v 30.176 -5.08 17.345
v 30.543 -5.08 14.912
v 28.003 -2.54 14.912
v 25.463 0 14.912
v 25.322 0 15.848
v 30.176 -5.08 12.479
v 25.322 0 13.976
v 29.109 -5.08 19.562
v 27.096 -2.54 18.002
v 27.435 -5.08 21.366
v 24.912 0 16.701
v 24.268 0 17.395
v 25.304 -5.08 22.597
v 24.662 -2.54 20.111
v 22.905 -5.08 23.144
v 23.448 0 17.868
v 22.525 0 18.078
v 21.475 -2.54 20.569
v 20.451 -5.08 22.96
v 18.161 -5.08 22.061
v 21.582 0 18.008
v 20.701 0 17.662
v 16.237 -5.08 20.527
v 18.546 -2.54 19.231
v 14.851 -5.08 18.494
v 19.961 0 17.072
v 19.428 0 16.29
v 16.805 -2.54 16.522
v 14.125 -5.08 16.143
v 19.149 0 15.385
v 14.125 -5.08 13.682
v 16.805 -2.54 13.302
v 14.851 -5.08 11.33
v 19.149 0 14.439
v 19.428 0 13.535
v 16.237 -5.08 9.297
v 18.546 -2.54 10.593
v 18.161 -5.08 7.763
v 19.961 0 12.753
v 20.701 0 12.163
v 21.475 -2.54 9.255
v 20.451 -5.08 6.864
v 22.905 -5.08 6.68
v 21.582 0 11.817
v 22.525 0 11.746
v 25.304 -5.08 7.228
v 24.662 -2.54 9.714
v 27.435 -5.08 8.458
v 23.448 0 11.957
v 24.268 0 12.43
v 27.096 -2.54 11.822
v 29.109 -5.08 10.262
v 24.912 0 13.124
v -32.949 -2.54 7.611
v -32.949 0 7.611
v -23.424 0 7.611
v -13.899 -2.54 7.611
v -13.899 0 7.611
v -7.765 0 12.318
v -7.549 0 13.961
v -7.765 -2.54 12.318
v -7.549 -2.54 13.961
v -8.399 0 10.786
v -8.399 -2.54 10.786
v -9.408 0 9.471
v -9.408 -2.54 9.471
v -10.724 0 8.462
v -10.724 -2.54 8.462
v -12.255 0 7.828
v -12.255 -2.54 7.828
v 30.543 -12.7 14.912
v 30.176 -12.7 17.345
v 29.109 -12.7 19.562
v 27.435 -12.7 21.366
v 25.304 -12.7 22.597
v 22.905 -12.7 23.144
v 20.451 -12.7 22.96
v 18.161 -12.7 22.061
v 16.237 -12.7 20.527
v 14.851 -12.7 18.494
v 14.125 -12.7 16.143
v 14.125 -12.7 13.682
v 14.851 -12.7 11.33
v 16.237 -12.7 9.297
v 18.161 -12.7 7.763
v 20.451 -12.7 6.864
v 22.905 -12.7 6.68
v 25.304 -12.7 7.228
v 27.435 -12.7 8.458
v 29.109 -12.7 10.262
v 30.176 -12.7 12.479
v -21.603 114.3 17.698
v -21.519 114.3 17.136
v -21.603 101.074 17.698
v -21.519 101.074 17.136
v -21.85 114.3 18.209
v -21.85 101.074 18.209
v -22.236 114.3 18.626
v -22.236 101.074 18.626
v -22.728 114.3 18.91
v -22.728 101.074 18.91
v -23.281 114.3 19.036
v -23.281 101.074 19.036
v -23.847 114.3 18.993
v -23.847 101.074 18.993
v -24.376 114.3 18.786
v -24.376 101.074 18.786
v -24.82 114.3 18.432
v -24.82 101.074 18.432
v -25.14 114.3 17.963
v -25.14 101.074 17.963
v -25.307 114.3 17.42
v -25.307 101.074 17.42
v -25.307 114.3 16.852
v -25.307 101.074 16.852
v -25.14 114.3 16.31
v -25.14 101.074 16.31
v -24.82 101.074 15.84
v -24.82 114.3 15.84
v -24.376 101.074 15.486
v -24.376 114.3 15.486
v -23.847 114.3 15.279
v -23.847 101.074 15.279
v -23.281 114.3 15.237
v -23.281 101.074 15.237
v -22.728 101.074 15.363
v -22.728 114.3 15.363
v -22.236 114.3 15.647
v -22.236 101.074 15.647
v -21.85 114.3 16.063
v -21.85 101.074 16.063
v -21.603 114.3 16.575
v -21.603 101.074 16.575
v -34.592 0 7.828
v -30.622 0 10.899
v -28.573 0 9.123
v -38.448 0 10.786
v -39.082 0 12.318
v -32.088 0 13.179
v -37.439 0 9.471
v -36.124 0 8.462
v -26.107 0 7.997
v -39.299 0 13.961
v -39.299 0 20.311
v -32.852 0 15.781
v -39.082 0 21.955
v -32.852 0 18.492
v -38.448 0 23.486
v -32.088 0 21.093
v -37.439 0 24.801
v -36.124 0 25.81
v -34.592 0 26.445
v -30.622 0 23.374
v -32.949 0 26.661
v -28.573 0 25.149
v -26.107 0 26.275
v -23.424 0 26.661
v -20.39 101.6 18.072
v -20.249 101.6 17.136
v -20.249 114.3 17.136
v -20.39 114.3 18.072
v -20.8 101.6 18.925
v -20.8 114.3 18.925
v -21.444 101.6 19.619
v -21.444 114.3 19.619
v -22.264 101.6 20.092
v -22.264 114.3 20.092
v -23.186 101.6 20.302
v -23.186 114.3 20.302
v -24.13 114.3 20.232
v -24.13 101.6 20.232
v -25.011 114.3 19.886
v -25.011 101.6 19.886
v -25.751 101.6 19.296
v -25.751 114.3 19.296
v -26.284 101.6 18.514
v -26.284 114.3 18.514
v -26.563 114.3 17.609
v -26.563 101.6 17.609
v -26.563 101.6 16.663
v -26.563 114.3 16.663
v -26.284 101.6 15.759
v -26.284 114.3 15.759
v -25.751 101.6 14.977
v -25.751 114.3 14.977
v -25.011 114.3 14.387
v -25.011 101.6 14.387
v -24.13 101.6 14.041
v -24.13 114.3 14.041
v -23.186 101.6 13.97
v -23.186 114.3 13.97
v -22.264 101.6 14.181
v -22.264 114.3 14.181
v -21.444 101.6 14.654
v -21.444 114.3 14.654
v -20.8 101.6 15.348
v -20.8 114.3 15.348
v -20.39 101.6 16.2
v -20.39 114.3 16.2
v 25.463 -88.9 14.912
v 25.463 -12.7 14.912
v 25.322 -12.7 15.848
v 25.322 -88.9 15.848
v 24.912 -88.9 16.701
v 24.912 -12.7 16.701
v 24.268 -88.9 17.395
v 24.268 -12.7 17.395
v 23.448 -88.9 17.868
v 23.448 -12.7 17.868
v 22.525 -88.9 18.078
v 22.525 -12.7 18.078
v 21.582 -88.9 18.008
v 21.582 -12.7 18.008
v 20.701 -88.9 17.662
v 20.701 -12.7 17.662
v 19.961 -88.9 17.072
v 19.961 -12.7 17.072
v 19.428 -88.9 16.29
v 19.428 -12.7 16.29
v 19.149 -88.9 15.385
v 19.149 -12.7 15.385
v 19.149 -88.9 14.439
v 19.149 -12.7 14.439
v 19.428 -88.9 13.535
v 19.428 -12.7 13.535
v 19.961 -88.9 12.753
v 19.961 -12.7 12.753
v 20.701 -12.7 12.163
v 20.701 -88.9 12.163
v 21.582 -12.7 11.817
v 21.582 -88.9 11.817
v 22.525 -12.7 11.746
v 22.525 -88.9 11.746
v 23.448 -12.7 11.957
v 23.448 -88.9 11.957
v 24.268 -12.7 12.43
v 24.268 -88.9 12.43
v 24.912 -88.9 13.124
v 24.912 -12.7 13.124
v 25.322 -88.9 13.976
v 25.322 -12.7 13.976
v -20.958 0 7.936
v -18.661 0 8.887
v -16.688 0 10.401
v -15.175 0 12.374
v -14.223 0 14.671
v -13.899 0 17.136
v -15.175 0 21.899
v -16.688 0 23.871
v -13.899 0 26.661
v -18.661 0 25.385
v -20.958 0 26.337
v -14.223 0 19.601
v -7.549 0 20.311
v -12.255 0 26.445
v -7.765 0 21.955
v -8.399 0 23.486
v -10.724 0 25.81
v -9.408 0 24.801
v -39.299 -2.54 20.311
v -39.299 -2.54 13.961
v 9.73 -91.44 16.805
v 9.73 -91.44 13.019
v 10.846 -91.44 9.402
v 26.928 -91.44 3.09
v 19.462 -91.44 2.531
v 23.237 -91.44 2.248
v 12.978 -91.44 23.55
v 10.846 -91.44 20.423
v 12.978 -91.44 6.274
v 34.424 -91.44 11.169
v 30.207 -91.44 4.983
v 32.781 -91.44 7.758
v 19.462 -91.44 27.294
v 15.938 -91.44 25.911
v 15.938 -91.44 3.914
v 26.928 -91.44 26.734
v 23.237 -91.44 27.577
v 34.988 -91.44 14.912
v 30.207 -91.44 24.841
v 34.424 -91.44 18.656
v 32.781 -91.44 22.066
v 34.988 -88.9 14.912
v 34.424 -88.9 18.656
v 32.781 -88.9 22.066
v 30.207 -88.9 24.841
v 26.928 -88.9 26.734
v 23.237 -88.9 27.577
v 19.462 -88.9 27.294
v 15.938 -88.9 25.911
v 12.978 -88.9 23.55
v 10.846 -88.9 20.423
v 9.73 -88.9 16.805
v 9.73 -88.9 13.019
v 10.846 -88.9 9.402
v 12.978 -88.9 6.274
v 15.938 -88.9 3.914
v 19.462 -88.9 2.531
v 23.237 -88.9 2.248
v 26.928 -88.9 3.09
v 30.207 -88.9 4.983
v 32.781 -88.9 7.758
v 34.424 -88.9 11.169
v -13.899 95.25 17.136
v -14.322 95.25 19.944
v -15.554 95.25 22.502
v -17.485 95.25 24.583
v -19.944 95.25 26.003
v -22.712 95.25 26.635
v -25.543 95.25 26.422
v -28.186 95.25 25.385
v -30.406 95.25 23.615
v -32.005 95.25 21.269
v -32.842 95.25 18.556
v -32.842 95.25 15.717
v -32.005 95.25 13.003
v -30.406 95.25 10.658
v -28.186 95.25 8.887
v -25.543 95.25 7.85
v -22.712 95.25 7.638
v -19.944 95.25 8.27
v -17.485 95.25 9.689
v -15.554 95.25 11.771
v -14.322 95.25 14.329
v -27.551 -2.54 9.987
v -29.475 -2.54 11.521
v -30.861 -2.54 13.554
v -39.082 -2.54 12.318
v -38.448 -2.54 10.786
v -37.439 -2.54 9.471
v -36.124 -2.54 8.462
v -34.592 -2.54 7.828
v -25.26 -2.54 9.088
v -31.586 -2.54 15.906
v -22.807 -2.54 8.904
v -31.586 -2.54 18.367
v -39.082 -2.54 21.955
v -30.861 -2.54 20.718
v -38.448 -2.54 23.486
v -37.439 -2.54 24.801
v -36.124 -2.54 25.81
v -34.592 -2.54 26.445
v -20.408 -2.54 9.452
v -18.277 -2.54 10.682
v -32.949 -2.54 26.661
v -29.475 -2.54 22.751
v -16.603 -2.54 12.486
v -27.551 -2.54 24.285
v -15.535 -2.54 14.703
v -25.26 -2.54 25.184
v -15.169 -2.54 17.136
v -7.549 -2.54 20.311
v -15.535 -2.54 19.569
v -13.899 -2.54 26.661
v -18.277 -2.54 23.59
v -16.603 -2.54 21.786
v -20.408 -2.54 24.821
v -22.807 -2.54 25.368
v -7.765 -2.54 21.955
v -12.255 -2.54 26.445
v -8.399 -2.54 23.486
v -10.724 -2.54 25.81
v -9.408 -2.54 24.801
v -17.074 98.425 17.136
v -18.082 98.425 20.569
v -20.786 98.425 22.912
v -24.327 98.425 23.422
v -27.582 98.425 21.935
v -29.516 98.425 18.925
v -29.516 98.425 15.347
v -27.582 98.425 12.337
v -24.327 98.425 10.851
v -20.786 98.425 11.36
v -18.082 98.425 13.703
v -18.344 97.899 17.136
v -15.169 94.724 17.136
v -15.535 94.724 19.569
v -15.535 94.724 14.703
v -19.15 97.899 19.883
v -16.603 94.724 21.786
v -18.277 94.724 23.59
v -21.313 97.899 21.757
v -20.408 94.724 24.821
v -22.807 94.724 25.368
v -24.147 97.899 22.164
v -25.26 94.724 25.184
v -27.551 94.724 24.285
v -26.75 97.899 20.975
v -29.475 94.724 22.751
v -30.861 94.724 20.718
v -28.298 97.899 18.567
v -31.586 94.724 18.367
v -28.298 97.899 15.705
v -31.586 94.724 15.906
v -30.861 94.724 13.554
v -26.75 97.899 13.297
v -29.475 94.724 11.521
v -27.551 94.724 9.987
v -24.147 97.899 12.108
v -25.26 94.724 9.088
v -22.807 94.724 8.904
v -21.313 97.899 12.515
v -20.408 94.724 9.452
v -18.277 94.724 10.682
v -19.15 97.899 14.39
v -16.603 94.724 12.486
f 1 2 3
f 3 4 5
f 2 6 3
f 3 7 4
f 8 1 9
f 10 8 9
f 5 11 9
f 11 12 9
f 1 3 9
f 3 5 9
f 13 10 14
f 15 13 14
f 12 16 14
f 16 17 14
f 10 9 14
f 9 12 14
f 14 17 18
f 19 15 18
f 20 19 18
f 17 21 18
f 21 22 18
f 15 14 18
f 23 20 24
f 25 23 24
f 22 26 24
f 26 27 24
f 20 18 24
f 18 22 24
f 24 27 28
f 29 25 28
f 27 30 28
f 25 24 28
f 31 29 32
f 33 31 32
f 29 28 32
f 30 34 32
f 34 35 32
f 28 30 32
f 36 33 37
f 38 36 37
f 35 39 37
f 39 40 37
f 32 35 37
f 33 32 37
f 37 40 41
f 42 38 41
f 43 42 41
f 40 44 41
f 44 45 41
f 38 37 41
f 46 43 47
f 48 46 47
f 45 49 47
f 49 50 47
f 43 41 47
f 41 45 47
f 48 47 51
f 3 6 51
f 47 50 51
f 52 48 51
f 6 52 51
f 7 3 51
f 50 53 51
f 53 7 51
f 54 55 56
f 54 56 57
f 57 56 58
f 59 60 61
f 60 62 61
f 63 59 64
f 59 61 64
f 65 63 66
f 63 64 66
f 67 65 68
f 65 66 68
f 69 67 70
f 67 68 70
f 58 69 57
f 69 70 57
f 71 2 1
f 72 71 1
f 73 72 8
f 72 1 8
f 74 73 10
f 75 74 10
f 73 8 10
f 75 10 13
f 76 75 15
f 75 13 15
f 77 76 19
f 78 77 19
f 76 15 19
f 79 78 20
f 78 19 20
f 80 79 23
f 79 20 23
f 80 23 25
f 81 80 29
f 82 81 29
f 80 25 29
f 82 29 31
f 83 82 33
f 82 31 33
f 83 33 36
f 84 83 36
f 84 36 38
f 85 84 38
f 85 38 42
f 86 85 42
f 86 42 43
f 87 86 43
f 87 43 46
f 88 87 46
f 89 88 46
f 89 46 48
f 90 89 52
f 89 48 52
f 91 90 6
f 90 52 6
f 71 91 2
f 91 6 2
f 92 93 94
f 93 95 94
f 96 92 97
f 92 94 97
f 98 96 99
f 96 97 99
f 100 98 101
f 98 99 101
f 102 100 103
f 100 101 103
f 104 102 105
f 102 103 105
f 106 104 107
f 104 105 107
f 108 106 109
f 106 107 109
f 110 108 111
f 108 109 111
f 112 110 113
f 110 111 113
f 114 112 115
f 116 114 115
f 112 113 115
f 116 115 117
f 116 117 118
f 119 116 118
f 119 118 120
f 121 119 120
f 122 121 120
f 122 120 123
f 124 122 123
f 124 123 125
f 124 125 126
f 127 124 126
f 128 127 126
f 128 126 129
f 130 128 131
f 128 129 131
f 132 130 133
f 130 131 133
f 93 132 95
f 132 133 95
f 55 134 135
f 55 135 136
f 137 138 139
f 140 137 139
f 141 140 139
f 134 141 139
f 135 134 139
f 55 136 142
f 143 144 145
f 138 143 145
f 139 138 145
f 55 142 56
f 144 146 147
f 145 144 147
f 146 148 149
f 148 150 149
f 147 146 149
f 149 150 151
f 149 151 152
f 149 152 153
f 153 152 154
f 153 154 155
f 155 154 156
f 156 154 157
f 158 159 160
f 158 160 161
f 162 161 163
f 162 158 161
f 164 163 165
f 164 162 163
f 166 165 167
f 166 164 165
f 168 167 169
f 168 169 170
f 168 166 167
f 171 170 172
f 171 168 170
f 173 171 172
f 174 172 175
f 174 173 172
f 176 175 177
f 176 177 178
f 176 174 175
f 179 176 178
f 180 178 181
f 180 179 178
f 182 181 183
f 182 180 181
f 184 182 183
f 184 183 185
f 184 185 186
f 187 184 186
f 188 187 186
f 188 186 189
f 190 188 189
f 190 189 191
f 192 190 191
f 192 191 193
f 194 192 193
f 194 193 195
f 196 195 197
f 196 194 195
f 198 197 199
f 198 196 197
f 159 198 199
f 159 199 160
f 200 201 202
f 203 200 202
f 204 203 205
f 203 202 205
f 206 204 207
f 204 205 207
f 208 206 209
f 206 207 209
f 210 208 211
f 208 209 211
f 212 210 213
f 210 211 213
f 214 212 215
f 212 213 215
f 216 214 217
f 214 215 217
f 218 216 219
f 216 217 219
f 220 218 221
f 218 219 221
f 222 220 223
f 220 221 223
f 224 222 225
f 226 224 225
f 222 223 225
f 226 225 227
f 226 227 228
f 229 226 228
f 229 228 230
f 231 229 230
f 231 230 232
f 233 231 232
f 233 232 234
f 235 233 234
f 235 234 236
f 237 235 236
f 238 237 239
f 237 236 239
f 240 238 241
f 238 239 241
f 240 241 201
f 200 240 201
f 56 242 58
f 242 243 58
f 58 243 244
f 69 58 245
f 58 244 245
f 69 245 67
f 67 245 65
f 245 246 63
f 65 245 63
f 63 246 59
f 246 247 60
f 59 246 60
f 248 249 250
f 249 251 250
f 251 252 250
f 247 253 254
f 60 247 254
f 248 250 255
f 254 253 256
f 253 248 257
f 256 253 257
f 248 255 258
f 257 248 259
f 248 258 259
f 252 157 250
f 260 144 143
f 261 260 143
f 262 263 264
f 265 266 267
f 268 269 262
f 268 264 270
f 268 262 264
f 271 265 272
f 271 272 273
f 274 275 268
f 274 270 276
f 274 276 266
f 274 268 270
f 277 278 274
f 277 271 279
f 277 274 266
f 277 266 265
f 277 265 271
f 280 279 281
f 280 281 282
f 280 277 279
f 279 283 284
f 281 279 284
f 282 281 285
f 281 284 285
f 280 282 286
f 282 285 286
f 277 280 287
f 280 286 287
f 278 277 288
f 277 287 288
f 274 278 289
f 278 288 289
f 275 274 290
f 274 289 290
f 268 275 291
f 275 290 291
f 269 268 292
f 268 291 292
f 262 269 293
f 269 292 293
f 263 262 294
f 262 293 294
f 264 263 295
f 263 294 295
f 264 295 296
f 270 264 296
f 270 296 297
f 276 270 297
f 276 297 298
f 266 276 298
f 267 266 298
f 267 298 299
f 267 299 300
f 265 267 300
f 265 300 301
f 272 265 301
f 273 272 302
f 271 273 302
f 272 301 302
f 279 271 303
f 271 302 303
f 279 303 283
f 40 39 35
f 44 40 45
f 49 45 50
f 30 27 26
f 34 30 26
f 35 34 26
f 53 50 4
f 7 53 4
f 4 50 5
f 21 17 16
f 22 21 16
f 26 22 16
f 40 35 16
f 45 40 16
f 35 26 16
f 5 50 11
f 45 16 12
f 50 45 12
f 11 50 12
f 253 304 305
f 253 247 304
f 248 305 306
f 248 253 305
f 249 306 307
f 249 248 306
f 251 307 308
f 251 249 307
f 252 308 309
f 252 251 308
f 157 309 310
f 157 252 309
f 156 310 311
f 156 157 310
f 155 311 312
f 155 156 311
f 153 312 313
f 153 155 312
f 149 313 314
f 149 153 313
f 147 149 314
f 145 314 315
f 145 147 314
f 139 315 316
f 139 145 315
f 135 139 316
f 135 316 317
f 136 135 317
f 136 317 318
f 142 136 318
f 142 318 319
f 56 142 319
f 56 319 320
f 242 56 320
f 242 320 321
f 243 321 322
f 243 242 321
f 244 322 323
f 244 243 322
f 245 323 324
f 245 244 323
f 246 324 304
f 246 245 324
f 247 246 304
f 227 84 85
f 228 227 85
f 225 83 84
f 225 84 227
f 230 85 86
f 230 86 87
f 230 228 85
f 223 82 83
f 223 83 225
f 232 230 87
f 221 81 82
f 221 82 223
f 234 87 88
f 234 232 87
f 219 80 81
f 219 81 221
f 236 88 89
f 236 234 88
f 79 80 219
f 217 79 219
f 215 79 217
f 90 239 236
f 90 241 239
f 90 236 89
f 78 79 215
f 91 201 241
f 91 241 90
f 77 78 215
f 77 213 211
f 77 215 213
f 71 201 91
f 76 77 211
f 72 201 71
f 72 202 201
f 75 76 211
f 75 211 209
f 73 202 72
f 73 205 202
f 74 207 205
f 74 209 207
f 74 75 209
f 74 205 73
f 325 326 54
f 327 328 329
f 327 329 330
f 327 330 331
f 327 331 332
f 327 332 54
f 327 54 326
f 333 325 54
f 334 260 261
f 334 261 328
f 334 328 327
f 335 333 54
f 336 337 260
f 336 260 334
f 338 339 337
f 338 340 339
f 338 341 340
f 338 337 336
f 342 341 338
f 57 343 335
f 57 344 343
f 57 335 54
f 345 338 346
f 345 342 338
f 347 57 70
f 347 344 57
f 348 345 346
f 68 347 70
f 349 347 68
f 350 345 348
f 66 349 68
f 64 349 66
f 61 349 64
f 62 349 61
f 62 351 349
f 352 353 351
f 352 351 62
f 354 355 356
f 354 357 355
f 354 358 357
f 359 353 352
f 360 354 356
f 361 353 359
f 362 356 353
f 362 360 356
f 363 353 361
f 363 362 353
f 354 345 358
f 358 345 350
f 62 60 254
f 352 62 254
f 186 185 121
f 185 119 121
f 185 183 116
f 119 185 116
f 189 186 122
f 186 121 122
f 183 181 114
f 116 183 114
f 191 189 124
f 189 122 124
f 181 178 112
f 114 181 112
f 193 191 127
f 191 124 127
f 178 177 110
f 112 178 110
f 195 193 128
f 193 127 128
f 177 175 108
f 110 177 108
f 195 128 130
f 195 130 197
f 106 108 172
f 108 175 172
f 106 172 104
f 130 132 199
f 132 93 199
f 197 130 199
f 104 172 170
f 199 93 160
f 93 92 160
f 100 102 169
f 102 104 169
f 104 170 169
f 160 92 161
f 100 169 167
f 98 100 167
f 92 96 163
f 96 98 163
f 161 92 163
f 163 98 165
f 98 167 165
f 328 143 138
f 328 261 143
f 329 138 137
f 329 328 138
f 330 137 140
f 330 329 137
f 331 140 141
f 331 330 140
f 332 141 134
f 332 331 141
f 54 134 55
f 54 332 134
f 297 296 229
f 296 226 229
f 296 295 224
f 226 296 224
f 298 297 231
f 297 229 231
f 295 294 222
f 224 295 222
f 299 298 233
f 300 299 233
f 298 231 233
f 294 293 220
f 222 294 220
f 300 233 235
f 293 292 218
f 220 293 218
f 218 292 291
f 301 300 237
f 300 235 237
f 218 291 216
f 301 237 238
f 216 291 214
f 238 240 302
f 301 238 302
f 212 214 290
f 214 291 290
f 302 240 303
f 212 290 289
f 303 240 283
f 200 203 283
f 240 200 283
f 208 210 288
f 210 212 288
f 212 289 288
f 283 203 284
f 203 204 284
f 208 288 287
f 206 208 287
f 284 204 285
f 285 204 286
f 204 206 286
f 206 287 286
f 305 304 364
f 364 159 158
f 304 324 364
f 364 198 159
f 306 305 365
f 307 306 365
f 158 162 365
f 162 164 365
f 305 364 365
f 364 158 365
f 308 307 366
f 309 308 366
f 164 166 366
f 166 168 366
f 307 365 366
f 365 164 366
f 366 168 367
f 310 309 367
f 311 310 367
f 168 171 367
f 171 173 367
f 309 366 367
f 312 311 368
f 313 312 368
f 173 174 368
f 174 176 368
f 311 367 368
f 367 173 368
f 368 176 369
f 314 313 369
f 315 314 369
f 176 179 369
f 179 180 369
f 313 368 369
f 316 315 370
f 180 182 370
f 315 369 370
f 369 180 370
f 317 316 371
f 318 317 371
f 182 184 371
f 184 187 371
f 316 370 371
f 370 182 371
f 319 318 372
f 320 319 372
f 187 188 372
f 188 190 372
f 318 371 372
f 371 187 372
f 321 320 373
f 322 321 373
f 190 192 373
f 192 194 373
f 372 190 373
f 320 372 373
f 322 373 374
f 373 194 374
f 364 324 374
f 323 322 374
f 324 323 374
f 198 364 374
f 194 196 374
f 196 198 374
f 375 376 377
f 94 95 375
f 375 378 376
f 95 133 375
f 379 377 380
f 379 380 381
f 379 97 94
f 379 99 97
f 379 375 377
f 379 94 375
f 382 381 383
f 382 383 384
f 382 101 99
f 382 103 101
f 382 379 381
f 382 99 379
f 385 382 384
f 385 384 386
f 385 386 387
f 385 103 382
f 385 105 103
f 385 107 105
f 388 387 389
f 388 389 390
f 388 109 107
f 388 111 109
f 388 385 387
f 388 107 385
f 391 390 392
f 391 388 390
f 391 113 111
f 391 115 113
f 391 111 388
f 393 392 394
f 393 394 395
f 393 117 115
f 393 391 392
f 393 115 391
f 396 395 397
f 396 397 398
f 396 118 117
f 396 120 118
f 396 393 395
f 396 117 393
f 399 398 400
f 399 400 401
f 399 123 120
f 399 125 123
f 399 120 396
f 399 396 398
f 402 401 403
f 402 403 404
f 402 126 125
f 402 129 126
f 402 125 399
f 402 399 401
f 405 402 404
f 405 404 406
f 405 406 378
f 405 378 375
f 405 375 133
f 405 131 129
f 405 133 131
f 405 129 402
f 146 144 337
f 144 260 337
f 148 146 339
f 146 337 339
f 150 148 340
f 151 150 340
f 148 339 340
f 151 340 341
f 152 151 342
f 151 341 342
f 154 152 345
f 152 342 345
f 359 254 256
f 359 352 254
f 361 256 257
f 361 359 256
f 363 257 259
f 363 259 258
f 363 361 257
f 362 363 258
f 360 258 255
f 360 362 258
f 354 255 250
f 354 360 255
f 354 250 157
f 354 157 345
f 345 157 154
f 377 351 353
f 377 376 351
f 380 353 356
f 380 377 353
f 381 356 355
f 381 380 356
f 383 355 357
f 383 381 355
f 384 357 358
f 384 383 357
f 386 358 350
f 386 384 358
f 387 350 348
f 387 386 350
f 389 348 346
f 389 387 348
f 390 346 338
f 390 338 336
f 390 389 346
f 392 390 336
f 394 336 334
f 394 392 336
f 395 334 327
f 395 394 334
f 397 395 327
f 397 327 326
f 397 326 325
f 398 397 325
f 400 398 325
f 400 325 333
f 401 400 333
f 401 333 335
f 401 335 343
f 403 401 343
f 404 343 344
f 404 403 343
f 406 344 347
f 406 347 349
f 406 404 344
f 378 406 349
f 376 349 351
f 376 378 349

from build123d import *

# Parameters (mm, degrees)
F0_R      = 9.525
F1_DEPTH  = 101.6
F2_SIZE   = 6.35
F3_DEPTH  = 12.7
F4_T      = -1.27
F5_DEPTH  = 25.4
F6_R      = 8.255
F7_DEPTH  = 2.54
F8_R      = 6.35
F9_R      = 8.255
F10_DEPTH = 12.7
F11_R     = 3.175
F12_DEPTH = 76.2
F13_R     = 12.7
F13_R_2   = 3.175
F14_DEPTH = 2.54
F15_SIZE  = 5.08


with BuildPart() as f1:
    # F0 (on Front) → F1 (new body)
    with BuildSketch(Plane.XZ):
        with Locations((-23.4235748649, 17.1361938119)):
            Circle(F0_R)
    extrude(amount=-F1_DEPTH)

    # F2
    f2_edges = [f1.edges().sort_by_distance(p)[0] for p in [
        (-32.948575, 101.6, 17.136194),
    ]]
    chamfer(f2_edges, length=F2_SIZE)

    # F3 (add): a face of the model
    f3_faces = [f1.faces().sort_by_distance(p)[0] for p in [
        (-23.4235748649, 101.6, 17.1361938119),
    ]]
    extrude(f3_faces, amount=F3_DEPTH)

    # F4
    f4_openings = [f1.faces().sort_by_distance(p)[0] for p in [
        (-23.423575, 0, 17.136194),
    ]]
    offset(amount=F4_T, openings=f4_openings, kind=Kind.INTERSECTION)

    # F5 (cut): a face of the model
    f5_faces = [f1.faces().sort_by_distance(p)[0] for p in [
        (-23.4235748649, 113.03, 17.1361938119),
    ]]
    extrude(f5_faces, amount=-F5_DEPTH, mode=Mode.SUBTRACT)

    # F6 (on face) → F7 (join)
    with BuildSketch(Plane.XZ):
        with BuildLine():
            Line((-23.4235748649, 26.6611938119), (-39.2985748649, 26.6611938119))
            Line((-39.2985748649, 26.6611938119), (-39.2985748649, 7.6111938119))
            Line((-39.2985748649, 7.6111938119), (-23.4235748649, 7.6111938119))
            ThreePointArc((-23.4235748649, 7.6111938119), (-32.9485748649, 17.1361938119), (-23.4235748649, 26.6611938119))
        make_face()
        with BuildLine():
            Line((-7.5485748649, 26.6611938119), (-23.4235748649, 26.6611938119))
            ThreePointArc((-23.4235748649, 26.6611938119), (-16.6883827741, 23.8713859027), (-13.8985748649, 17.1361938119))
            ThreePointArc((-13.8985748649, 17.1361938119), (-16.6883827741, 10.4010017211), (-23.4235748649, 7.6111938119))
            Line((-23.4235748649, 7.6111938119), (-7.5485748649, 7.6111938119))
            Line((-7.5485748649, 7.6111938119), (-7.5485748649, 26.6611938119))
        make_face()
        with BuildLine():
            ThreePointArc((-13.8985748649, 17.1361938119), (-16.6883827741, 23.8713859027), (-23.4235748649, 26.6611938119))
            ThreePointArc((-23.4235748649, 26.6611938119), (-32.9485748649, 17.1361938119), (-23.4235748649, 7.6111938119))
            ThreePointArc((-23.4235748649, 7.6111938119), (-16.6883827741, 10.4010017211), (-13.8985748649, 17.1361938119))
        make_face()
        with Locations((-23.4235748649, 17.1361938119)):
            Circle(F6_R, mode=Mode.SUBTRACT)
    extrude(amount=F7_DEPTH)

    # F8
    f8_edges = [f1.edges().sort_by_distance(p)[0] for p in [
        (-39.298575, -1.27, 26.661194),
        (-39.298575, -1.27, 7.611194),
        (-7.548575, -1.27, 26.661194),
        (-7.548575, -1.27, 7.611194),
    ]]
    fillet(f8_edges, radius=F8_R)


with BuildPart() as f10:
    # F9 (on Front) → F10 (new body)
    with BuildSketch(Plane.XZ):
        with Locations((22.2882274538, 14.9122010916)):
            Circle(F9_R)
    extrude(amount=F10_DEPTH)

    # F11 (on face) → F12 (join)
    with BuildSketch(Plane.XZ.offset(12.7)):
        with Locations((22.2882274538, 14.9122010916)):
            Circle(F11_R)
    extrude(amount=F12_DEPTH)

    # F13 (on face) → F14 (join)
    with BuildSketch(Plane.XZ.offset(88.9)):
        with Locations((22.2882274538, 14.9122010916)):
            Circle(F13_R)
        with Locations((22.2882274538, 14.9122010916)):
            Circle(F13_R_2, mode=Mode.SUBTRACT)
        with Locations((22.2882274538, 14.9122010916)):
            Circle(F13_R_2)
    extrude(amount=F14_DEPTH)

    # F15
    f15_edges = [f10.edges().sort_by_distance(p)[0] for p in [
        (14.033227, 0, 14.912201),
    ]]
    chamfer(f15_edges, length=F15_SIZE)


solid = Compound([f1.part, f10.part])
